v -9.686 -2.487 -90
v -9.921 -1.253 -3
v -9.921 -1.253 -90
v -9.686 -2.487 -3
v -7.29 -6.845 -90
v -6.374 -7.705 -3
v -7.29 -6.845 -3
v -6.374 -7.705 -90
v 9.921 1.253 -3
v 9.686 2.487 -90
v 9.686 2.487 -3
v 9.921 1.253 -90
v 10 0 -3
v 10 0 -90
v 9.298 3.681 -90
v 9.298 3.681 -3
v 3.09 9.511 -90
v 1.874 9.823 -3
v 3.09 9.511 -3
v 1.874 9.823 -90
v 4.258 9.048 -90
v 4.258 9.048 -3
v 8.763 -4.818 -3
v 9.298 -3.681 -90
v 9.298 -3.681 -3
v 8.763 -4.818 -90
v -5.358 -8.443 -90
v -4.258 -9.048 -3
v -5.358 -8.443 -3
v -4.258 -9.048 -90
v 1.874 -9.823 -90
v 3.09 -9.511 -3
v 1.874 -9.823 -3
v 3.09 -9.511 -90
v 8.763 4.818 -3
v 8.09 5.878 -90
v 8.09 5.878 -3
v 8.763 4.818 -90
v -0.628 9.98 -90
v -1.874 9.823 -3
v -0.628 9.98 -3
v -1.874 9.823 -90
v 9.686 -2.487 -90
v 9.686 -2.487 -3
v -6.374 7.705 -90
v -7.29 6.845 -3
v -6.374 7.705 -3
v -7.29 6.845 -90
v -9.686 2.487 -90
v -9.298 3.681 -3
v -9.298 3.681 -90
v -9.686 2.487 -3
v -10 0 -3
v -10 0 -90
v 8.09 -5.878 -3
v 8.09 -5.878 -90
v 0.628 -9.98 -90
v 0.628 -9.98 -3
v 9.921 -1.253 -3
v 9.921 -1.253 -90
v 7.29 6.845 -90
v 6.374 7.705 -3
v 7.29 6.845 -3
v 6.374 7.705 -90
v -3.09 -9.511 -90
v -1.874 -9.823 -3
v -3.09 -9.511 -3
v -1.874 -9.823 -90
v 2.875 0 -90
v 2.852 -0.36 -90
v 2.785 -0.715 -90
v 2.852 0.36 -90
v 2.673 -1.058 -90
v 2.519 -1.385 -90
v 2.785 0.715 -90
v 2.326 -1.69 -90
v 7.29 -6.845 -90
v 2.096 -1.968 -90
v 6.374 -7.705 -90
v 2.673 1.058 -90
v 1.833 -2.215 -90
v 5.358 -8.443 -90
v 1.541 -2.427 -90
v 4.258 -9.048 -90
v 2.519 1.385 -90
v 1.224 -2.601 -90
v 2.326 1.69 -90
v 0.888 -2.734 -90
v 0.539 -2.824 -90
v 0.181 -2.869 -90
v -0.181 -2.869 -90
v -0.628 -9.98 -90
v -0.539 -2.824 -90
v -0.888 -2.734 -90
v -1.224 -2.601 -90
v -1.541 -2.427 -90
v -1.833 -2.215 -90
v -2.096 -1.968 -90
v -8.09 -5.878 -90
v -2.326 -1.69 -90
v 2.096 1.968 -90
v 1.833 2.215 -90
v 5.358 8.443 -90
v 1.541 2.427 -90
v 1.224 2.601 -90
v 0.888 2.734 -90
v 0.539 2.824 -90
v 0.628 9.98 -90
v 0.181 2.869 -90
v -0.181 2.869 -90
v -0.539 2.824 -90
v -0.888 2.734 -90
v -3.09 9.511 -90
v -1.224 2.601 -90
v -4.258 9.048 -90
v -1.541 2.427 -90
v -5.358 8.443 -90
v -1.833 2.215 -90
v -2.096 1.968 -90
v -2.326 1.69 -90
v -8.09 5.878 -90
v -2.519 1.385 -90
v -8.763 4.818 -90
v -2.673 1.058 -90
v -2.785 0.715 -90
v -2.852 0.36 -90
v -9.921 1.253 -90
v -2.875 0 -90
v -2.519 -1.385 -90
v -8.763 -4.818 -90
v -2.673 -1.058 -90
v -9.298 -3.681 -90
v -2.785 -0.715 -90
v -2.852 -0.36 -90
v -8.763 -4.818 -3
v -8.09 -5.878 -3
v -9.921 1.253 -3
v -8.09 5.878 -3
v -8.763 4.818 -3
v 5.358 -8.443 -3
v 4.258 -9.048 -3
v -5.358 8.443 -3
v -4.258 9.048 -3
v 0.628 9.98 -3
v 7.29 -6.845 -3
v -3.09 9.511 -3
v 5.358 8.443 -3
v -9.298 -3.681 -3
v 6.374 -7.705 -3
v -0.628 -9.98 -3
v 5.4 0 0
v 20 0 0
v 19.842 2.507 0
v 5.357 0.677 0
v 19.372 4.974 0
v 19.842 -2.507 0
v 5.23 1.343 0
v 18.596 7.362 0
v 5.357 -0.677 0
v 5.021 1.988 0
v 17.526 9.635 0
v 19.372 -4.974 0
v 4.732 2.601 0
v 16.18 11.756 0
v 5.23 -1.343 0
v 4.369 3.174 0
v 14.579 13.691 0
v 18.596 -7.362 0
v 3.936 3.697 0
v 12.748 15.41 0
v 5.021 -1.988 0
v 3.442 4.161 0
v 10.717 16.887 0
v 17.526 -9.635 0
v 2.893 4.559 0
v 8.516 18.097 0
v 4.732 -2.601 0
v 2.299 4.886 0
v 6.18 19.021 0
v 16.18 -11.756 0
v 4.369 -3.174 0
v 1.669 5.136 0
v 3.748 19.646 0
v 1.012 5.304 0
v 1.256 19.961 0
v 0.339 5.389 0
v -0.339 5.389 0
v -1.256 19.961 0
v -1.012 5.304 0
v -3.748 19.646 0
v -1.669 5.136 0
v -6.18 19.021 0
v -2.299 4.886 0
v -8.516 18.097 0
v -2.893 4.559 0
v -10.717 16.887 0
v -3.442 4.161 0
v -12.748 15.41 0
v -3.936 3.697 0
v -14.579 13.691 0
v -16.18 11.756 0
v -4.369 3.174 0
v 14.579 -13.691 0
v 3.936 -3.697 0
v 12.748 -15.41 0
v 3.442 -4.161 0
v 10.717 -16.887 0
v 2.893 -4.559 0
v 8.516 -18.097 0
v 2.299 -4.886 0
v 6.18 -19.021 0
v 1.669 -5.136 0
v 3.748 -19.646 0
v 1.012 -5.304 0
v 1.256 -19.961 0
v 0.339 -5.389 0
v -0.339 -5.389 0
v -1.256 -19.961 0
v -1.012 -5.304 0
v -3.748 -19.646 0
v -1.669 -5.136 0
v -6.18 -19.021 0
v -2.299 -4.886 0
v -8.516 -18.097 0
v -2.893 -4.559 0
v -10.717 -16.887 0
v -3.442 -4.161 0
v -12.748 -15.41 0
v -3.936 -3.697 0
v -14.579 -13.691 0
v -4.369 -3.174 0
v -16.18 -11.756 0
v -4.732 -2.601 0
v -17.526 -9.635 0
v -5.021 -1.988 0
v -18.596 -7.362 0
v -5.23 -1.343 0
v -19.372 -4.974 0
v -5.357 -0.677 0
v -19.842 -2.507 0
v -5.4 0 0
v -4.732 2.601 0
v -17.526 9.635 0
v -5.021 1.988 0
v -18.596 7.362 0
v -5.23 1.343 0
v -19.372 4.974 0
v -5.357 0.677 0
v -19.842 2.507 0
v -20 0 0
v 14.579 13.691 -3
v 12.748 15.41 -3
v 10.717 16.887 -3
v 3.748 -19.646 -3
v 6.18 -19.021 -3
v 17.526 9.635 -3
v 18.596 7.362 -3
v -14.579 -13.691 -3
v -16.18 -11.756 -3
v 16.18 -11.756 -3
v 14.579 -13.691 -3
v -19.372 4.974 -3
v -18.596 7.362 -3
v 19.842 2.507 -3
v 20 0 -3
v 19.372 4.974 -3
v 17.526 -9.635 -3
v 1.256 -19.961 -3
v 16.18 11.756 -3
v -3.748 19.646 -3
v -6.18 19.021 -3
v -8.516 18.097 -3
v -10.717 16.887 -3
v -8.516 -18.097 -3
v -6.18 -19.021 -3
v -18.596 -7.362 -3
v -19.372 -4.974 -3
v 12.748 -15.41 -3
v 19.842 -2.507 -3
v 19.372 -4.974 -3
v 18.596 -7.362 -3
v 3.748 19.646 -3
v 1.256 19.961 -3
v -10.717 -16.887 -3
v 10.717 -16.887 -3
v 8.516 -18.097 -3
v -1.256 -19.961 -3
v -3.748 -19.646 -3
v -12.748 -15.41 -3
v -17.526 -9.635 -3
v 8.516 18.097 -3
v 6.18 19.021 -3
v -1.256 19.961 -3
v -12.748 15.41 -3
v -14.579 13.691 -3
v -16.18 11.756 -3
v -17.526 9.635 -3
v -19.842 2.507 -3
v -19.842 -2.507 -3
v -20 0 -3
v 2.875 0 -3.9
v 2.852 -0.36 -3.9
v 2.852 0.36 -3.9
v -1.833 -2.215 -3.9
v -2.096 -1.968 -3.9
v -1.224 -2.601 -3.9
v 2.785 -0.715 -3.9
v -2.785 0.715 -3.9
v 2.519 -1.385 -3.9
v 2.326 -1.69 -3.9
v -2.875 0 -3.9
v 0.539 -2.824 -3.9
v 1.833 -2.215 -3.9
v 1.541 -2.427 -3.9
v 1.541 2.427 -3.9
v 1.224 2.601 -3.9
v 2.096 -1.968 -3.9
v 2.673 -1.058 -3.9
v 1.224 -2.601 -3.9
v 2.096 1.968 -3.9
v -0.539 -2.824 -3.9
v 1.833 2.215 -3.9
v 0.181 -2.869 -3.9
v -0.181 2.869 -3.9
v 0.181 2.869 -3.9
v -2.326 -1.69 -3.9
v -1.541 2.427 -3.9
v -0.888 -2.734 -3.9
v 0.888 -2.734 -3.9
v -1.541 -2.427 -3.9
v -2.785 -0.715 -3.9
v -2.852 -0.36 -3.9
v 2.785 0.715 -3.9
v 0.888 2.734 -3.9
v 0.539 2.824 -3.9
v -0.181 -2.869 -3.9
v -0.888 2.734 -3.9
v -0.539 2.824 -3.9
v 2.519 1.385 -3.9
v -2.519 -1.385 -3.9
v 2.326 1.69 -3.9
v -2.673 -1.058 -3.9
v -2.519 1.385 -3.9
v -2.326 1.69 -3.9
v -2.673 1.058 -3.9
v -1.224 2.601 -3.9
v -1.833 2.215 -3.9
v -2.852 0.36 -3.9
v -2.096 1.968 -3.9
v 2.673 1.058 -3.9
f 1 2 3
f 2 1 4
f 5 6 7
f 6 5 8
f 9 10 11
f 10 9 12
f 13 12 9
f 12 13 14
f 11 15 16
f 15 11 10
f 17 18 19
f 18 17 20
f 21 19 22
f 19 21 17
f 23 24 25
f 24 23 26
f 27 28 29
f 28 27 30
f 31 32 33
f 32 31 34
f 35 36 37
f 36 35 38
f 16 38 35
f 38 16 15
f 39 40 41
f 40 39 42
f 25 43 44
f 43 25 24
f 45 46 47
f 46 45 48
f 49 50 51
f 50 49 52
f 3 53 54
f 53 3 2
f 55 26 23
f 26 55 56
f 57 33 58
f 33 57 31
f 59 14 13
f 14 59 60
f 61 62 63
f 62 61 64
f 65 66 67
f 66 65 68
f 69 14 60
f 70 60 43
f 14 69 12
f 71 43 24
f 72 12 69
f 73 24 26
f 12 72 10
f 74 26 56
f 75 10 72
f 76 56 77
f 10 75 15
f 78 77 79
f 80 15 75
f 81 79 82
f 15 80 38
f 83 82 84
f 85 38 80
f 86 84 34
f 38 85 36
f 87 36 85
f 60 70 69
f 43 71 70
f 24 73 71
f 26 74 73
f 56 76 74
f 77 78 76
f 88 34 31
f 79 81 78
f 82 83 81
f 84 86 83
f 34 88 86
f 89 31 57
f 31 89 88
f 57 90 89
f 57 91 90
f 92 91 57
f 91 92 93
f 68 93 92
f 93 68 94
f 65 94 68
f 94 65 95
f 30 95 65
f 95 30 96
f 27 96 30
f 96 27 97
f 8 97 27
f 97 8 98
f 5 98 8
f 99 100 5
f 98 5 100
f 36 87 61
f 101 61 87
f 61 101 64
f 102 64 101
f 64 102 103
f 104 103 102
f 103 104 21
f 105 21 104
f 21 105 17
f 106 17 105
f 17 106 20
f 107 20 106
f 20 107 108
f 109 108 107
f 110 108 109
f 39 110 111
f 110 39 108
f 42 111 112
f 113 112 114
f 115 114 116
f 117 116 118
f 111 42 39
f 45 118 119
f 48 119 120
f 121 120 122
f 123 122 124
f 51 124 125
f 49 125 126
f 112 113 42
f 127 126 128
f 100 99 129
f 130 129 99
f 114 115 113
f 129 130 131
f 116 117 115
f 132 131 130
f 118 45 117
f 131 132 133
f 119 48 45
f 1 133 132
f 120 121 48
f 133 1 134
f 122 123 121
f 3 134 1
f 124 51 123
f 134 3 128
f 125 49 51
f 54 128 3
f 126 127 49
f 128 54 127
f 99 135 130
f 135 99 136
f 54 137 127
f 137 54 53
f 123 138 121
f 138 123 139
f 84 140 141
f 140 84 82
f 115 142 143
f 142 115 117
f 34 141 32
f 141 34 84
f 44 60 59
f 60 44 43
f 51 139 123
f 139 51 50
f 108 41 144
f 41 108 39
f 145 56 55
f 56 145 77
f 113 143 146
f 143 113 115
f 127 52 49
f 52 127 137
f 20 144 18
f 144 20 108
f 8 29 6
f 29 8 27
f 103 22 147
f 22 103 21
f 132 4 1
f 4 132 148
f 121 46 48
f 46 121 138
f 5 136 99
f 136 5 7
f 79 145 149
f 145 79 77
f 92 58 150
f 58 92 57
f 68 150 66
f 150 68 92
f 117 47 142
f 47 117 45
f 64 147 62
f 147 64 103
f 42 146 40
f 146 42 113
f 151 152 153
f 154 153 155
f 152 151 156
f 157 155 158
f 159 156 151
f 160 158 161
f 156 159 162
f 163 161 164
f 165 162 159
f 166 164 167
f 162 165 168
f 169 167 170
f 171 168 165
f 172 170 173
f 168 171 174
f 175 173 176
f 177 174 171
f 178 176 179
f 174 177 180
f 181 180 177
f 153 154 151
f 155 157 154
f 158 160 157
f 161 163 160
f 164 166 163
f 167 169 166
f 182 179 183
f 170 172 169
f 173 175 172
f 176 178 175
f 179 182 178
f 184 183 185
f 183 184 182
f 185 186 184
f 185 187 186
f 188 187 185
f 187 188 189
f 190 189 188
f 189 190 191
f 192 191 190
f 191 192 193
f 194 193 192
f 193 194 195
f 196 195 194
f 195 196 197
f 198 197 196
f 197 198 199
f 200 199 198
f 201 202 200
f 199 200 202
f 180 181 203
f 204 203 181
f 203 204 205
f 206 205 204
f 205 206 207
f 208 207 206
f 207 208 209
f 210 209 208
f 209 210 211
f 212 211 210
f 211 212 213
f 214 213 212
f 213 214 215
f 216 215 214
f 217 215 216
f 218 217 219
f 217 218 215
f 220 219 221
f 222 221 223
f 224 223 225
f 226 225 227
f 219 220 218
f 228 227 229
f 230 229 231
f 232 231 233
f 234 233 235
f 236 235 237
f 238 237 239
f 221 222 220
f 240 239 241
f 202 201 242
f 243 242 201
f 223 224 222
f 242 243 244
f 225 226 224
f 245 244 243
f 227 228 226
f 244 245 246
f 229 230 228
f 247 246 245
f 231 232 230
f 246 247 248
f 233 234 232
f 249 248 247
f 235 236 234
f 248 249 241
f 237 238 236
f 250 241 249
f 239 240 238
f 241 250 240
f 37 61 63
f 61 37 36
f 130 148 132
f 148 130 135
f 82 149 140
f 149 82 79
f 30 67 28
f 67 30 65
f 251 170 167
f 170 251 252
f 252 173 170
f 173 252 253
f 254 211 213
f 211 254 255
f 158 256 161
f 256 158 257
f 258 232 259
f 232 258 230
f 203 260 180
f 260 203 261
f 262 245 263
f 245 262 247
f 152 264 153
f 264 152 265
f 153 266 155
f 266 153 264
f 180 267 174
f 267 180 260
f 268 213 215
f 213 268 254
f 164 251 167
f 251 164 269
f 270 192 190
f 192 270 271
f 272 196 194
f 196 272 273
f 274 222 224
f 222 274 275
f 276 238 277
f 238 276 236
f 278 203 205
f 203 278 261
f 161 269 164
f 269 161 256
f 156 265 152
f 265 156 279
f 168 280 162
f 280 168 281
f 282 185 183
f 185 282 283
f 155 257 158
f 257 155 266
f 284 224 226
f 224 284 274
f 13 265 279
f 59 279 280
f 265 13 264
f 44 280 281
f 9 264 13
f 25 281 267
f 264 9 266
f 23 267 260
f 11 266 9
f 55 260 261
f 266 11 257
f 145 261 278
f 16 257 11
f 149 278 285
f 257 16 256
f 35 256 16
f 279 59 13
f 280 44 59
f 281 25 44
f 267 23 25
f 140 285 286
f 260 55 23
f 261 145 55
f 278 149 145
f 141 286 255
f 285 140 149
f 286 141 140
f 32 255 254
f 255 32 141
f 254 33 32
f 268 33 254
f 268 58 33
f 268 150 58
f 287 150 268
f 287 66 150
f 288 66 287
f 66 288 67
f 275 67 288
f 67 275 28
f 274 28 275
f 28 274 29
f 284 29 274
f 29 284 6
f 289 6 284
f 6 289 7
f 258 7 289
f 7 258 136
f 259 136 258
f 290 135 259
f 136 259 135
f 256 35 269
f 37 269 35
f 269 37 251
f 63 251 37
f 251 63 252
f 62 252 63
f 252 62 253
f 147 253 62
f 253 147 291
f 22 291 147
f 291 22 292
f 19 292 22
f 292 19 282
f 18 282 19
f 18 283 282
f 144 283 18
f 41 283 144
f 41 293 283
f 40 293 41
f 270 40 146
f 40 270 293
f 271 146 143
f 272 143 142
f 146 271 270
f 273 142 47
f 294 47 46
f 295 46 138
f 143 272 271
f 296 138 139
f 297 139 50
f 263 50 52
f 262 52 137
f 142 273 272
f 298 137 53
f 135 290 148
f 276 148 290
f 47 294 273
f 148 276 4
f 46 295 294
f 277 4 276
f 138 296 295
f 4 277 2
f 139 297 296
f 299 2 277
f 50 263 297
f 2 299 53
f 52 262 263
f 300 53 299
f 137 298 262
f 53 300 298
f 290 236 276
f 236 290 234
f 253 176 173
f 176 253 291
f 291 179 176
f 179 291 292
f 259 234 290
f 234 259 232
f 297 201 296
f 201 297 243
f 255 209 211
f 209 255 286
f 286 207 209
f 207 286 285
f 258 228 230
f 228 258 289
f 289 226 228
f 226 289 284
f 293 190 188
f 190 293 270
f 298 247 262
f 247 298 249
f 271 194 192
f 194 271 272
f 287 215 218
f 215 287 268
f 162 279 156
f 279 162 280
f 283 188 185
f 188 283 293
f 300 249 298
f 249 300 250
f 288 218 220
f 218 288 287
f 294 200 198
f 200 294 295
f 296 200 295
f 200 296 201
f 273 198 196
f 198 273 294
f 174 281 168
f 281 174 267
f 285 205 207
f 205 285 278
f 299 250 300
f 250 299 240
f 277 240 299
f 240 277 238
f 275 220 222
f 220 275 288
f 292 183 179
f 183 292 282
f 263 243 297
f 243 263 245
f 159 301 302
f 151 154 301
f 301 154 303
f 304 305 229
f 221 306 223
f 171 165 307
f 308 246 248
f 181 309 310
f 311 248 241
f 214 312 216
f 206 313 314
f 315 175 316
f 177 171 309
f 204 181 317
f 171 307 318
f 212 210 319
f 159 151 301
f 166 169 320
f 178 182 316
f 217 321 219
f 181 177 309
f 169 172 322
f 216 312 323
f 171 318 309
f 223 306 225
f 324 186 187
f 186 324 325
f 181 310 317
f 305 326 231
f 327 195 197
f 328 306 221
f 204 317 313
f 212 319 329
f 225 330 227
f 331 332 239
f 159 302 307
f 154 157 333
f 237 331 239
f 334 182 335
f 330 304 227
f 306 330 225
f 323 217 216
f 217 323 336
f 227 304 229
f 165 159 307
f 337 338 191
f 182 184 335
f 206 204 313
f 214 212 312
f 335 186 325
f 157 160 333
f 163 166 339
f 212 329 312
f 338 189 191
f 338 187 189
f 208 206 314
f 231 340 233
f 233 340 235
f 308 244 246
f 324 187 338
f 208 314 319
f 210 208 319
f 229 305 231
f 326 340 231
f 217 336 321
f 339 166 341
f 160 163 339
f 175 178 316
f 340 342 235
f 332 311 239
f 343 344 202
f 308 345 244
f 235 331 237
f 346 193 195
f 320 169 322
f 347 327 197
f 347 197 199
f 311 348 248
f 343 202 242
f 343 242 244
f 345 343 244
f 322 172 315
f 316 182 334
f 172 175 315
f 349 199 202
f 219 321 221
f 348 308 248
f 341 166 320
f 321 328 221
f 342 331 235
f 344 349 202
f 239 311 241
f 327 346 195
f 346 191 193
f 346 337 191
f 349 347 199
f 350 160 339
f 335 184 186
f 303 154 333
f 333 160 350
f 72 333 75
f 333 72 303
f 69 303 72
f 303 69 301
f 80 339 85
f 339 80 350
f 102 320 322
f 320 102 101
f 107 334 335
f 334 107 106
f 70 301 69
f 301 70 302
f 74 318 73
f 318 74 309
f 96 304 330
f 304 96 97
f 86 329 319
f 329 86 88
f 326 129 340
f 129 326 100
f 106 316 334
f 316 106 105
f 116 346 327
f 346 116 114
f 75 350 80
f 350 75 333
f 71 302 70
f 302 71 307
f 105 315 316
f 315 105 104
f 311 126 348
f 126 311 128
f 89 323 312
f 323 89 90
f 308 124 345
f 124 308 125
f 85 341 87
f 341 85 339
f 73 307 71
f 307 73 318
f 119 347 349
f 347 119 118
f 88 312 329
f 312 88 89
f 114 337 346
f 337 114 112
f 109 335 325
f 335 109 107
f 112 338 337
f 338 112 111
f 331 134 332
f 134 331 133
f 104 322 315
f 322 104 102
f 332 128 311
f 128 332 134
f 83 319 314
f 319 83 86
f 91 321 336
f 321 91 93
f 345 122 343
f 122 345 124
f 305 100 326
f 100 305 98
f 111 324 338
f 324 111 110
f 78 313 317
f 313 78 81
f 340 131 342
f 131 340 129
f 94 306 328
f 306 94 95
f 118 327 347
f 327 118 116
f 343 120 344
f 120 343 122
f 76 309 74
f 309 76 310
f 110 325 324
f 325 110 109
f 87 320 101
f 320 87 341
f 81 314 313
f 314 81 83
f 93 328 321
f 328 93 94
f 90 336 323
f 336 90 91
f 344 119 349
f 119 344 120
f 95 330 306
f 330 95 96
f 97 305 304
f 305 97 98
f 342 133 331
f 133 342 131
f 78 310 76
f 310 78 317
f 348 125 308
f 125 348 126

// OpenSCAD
$fn = 50;


difference() {
	union() {
		translate(v = [0, 0, -90.0000000000]) {
			cylinder(h = 90, r = 10.0000000000);
		}
		translate(v = [0, 0, -3.0000000000]) {
			cylinder(h = 3, r = 20.0000000000);
		}
	}
	union() {
		translate(v = [0, 0, 0]) {
			rotate(a = [0, 0, 0]) {
				difference() {
					union() {
						#translate(v = [0, 0, -90.0000000000]) {
							cylinder(h = 90, r = 2.6000000000);
						}
						#translate(v = [0, 0, -3.9000000000]) {
							cylinder(h = 3.9000000000, r = 10.0000000000, r1 = 2.8750000000, r2 = 5.4000000000);
						}
						#translate(v = [0, 0, -90.0000000000]) {
							cylinder(h = 90, r = 2.8750000000);
						}
						#translate(v = [0, 0, -90.0000000000]) {
							cylinder(h = 90, r = 2.6000000000);
						}
					}
					union();
				}
			}
		}
	}
}
